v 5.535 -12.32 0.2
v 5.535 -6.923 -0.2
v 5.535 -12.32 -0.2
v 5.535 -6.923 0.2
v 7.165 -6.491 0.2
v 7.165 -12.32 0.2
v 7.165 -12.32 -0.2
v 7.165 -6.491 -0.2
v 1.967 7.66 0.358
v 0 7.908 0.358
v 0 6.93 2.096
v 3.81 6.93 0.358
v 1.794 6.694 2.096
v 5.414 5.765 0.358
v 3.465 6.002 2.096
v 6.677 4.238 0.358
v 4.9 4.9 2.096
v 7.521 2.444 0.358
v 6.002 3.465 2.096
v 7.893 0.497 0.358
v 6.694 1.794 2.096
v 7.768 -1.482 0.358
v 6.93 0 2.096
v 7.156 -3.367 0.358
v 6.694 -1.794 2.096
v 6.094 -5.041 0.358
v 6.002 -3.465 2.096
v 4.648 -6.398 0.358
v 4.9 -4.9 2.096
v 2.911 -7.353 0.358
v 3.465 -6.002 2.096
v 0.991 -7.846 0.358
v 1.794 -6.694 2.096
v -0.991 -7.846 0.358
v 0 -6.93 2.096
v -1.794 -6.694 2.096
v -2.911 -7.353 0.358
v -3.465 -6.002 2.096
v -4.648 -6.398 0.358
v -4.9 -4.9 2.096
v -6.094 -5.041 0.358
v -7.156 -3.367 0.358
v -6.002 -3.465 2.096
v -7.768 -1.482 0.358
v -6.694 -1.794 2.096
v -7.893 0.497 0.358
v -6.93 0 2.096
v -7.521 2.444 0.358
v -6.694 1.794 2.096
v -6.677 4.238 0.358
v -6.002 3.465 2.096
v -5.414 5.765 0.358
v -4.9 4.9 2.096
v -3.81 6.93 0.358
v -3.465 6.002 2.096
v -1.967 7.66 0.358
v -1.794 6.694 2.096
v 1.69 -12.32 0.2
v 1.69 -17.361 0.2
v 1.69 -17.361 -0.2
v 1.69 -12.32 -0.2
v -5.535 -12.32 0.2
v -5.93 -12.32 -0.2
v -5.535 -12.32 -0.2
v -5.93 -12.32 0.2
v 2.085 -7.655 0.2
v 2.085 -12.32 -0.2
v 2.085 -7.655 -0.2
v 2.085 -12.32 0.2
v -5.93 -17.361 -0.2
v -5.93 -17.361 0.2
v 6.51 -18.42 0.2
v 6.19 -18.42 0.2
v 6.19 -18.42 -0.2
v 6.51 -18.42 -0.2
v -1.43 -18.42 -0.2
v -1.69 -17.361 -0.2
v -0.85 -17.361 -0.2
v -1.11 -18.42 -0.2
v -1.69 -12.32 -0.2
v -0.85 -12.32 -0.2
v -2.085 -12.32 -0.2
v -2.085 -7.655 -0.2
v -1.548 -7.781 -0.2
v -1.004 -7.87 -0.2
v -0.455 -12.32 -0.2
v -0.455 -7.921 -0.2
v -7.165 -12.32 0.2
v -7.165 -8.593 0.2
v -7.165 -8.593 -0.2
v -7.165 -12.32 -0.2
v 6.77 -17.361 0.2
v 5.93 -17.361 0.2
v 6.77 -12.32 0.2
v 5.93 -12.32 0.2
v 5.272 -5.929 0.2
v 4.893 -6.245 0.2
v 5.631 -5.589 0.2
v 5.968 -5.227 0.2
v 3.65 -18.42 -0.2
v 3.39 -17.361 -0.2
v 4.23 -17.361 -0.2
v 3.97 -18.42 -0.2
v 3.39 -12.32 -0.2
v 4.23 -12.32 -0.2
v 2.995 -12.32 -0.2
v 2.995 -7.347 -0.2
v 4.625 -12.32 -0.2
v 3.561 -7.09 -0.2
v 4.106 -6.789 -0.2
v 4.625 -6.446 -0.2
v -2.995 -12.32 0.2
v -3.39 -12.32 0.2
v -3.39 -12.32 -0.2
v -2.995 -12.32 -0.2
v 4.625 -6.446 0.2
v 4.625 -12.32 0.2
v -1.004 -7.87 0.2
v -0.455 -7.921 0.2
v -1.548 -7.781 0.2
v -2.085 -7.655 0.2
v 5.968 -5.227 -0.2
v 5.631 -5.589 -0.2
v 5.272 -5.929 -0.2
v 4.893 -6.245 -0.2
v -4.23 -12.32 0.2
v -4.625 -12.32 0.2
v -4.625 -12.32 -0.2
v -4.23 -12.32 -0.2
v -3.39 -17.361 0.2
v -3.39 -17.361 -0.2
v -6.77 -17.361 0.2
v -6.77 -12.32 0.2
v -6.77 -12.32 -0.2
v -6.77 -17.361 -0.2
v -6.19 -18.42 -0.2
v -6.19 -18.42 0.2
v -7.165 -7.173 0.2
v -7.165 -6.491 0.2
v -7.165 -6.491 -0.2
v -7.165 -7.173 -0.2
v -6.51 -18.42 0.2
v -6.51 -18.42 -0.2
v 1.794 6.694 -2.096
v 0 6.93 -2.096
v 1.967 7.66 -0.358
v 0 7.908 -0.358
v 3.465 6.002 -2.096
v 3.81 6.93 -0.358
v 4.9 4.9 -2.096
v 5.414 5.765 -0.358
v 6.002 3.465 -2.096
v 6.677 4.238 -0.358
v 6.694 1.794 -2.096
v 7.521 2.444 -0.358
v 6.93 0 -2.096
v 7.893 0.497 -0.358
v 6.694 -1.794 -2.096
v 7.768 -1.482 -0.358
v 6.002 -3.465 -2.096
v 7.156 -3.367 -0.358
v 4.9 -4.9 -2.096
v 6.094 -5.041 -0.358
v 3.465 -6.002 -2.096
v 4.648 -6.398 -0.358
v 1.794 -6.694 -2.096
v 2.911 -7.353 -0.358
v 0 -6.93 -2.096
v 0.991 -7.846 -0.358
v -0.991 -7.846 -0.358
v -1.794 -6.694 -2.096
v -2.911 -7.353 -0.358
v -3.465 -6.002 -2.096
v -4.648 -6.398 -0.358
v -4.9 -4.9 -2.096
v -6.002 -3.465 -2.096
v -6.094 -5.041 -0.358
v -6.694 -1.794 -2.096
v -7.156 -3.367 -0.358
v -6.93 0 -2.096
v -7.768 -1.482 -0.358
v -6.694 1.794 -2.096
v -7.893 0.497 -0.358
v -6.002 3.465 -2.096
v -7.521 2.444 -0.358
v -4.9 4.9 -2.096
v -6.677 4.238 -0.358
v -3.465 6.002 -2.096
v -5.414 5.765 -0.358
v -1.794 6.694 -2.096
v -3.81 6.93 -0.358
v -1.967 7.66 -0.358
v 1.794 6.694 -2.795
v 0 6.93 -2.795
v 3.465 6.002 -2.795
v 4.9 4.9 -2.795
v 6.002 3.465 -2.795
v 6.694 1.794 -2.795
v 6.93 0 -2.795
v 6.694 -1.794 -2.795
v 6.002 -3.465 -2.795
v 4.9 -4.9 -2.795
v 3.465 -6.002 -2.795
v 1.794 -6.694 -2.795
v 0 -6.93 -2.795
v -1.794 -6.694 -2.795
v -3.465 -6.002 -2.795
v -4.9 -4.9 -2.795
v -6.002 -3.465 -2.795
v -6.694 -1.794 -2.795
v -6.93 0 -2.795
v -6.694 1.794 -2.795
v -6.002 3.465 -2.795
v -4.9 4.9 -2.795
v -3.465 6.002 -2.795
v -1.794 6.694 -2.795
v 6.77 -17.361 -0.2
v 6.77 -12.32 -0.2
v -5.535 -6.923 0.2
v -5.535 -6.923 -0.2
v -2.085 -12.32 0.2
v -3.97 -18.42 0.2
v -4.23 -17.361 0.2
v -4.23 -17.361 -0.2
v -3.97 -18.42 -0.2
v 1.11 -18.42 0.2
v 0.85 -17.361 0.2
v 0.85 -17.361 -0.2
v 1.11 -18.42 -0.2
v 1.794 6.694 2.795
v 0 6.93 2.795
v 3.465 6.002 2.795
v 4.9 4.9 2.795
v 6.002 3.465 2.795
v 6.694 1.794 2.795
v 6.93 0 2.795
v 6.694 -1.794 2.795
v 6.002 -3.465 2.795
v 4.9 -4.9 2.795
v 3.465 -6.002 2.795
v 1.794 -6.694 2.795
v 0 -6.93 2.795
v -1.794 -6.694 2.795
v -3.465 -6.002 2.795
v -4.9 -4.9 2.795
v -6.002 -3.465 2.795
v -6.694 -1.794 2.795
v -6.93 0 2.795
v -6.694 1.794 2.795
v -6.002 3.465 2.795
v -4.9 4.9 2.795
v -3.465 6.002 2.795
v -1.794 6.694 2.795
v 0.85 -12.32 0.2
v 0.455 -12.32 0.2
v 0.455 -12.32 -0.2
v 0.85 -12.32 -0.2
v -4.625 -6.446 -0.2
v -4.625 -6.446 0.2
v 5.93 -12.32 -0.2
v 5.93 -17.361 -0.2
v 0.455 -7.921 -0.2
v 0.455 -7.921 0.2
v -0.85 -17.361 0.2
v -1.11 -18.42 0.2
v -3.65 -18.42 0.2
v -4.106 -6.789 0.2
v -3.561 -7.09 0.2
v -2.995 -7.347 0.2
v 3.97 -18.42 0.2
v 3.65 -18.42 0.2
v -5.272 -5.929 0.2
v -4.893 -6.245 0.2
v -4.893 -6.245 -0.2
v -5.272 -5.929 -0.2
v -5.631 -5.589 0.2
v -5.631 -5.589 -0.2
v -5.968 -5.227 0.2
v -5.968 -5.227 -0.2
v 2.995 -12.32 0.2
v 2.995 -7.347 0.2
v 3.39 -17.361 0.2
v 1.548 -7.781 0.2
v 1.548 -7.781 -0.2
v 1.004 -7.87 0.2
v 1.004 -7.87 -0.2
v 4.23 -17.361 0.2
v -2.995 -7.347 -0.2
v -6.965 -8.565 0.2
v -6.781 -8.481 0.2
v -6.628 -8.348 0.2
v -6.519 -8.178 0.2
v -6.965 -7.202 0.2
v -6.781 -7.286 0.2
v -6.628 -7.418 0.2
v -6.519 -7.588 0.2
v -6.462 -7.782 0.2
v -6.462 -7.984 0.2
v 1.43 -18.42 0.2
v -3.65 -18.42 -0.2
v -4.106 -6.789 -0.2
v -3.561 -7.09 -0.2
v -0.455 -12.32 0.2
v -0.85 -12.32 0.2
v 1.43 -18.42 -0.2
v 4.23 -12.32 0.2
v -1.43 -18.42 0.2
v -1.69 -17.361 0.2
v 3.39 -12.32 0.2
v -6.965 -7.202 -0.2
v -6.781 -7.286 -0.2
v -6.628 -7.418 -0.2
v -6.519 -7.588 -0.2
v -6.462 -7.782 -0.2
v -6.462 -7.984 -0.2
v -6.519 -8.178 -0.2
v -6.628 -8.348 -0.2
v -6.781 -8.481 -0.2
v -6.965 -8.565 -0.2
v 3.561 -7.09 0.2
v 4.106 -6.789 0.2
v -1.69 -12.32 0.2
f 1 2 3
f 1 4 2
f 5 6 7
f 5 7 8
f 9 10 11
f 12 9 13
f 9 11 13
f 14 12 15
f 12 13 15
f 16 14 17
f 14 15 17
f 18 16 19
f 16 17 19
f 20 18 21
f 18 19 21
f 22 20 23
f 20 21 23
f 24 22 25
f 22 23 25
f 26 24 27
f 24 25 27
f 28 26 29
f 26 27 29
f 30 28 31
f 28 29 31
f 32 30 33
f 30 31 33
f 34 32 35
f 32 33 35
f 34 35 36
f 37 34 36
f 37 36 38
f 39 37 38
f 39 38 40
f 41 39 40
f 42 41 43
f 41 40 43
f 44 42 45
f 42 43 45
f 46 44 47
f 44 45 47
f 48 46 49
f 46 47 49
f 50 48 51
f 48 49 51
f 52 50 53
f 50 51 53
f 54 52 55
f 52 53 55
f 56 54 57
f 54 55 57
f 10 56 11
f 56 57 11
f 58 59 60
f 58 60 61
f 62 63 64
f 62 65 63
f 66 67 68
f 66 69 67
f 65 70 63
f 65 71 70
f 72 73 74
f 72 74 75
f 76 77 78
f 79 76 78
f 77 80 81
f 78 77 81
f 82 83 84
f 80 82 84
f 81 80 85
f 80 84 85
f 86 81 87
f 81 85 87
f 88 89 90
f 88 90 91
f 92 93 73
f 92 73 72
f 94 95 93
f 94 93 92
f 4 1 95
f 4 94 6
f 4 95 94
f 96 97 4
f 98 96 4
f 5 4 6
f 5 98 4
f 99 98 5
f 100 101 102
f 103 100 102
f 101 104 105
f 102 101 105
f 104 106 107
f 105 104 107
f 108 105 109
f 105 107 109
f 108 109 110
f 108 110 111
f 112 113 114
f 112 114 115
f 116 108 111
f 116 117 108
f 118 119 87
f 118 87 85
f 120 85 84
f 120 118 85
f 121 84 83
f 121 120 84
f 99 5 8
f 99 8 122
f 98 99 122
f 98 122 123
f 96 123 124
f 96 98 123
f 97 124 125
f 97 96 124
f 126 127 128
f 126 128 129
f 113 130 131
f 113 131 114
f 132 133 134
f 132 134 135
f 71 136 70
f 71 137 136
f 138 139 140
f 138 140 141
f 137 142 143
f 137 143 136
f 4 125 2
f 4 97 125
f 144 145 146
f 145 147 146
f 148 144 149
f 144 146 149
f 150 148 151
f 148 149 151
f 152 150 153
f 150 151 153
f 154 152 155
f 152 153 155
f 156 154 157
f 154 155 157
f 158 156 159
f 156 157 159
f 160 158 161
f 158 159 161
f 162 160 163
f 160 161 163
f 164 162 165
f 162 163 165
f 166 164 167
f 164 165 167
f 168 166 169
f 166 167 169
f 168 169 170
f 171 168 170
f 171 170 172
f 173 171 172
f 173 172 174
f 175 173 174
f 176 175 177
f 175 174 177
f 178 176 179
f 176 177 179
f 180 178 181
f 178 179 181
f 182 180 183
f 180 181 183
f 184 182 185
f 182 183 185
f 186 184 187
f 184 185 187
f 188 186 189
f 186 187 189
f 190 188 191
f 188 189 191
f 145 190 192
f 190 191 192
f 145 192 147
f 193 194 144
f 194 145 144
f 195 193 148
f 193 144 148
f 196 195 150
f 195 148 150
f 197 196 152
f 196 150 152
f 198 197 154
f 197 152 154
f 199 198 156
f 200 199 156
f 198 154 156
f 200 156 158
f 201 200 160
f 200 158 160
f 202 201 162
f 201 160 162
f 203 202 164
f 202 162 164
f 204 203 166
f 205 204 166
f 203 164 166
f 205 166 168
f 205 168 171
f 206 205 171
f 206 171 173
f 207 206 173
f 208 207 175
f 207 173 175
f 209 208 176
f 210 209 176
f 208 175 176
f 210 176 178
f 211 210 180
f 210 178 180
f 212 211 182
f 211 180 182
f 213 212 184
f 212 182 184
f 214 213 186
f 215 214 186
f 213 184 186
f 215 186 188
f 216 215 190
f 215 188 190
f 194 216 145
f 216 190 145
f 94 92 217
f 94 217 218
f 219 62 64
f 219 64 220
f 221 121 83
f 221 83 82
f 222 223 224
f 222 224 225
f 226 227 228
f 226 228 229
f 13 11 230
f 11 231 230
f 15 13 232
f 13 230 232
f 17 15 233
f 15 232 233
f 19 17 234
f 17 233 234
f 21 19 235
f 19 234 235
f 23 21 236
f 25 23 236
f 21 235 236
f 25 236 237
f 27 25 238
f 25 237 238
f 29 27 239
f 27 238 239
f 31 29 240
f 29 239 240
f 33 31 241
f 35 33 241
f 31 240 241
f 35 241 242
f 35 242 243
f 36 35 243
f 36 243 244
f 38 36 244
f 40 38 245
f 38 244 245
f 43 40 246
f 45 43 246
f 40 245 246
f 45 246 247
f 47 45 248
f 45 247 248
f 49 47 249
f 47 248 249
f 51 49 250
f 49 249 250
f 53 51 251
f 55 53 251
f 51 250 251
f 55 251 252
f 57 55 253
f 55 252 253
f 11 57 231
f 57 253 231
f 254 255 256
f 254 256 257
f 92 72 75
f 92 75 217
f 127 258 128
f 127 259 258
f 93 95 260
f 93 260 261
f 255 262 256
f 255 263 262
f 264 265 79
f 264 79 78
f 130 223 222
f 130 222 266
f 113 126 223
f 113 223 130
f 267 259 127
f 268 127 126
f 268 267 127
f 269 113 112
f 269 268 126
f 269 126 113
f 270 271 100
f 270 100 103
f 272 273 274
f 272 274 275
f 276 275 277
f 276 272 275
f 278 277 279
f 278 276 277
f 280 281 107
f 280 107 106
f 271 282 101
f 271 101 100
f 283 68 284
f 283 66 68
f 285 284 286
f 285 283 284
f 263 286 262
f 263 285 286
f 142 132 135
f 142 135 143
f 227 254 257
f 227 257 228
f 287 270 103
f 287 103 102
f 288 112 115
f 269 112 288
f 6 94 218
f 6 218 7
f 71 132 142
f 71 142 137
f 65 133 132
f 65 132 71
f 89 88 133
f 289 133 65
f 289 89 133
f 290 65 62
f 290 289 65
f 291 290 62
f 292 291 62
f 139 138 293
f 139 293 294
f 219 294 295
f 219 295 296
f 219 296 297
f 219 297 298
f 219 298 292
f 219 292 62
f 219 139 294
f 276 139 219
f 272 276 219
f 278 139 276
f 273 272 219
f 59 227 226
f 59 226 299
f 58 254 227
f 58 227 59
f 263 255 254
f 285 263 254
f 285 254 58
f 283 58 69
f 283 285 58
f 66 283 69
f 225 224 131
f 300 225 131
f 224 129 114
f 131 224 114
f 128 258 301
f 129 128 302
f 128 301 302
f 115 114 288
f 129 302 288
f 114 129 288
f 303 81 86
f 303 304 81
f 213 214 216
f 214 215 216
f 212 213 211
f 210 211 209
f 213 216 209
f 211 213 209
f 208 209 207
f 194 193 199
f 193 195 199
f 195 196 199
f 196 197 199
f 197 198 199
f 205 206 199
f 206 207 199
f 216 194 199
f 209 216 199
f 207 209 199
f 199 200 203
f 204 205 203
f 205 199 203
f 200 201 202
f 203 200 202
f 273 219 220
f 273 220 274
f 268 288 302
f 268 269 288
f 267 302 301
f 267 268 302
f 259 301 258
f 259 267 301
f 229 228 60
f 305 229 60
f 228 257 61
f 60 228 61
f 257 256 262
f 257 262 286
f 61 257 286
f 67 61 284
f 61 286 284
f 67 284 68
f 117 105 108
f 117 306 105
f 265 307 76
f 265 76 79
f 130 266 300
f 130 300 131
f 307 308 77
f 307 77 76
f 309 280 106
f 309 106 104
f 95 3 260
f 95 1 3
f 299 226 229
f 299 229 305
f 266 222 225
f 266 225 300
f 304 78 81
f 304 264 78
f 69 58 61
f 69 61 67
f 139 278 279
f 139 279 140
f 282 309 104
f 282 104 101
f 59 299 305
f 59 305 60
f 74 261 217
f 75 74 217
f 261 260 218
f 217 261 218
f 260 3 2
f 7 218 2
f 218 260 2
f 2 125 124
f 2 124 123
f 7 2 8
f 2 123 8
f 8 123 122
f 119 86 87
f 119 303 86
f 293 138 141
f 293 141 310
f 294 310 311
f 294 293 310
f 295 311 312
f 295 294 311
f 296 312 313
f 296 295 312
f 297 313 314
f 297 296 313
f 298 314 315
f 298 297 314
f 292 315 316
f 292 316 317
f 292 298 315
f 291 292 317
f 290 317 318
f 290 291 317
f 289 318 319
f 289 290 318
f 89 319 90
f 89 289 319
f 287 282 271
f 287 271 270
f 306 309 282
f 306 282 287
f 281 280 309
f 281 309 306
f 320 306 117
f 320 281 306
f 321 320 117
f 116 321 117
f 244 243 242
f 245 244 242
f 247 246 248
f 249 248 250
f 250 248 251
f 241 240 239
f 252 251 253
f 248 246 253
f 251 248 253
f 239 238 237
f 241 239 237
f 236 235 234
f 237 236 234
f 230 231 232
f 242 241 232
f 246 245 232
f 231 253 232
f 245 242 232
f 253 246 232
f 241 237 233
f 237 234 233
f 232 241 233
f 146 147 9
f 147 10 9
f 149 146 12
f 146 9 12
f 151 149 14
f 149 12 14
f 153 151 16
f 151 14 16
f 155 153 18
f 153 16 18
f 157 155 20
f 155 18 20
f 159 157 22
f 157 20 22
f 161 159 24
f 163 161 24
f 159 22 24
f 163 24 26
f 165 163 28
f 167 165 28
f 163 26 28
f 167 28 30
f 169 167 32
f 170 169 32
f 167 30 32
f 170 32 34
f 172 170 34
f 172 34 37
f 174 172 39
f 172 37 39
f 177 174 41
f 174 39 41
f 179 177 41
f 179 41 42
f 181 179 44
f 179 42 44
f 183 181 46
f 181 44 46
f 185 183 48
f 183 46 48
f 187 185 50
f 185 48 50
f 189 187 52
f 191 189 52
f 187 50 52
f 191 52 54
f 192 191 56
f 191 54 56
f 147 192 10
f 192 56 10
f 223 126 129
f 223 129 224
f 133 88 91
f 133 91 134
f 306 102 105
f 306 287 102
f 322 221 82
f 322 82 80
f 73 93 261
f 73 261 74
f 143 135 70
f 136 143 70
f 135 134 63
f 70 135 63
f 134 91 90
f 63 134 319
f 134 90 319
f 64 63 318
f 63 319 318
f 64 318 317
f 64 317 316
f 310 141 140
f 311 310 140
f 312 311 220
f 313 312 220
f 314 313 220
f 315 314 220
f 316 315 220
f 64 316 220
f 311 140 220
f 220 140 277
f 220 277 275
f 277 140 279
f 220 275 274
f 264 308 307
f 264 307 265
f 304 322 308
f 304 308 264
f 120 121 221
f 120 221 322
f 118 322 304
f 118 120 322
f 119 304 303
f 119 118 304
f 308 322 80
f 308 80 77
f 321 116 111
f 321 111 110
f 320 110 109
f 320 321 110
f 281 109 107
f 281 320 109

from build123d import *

# Parameters (mm, degrees)
EXTRUDE6_DEPTH        = 0.2
EXTRUDE6_DEPTH_BACK   = 0.2
EXTRUDE6_2_DEPTH      = 0.2
EXTRUDE6_2_DEPTH_BACK = 0.2
EXTRUDE6_3_DEPTH      = 0.2
EXTRUDE6_3_DEPTH_BACK = 0.2
EXTRUDE6_4_DEPTH      = 0.2
EXTRUDE6_4_DEPTH_BACK = 0.2
EXTRUDE6_5_DEPTH      = 0.2
EXTRUDE6_5_DEPTH_BACK = 0.2
EXTRUDE6_6_DEPTH      = 0.2
EXTRUDE6_6_DEPTH_BACK = 0.2


with BuildPart() as part:
    # Sketch7 → Extrude6 (new body, two sides)
    with BuildSketch(Plane.XY) as extrude6_sk:
        with BuildLine():
            Line((-5.93, -12.32), (-5.535, -12.32))
            Line((-5.535, -12.32), (-5.535, -6.923244628))
            Line((-5.535, -6.923244628), (-4.893151867, -6.24528278))
            ThreePointArc((-4.893151867, -6.24528278), (-5.454552369, -5.761453866), (-5.968357327, -5.227351434))
            Line((-5.968357327, -5.227351434), (-7.165, -6.49132345))
            Line((-7.165, -6.49132345), (-7.165, -7.17281133))
            ThreePointArc((-7.165, -7.17281133), (-6.454703172, -7.883108158), (-7.165, -8.593404986))
            Line((-7.165, -8.593404986), (-7.165, -12.32))
            Line((-7.165, -12.32), (-6.77, -12.32))
            Line((-6.77, -12.32), (-6.77, -17.360738904))
            Line((-6.77, -17.360738904), (-6.510329667, -18.42))
            Line((-6.510329667, -18.42), (-6.189670333, -18.42))
            Line((-6.189670333, -18.42), (-5.93, -17.360738904))
            Line((-5.93, -17.360738904), (-5.93, -12.32))
        make_face()
    extrude(amount=EXTRUDE6_DEPTH)
    extrude(extrude6_sk.sketch, amount=-EXTRUDE6_DEPTH_BACK)


with BuildPart() as body_2:
    # Sketch7 → Extrude6 2 (new body, two sides)
    with BuildSketch(Plane.XY) as extrude6_2_sk:
        with BuildLine():
            Line((-4.625, -6.446384041), (-4.625, -12.32))
            Line((-4.625, -12.32), (-4.23, -12.32))
            Line((-4.23, -12.32), (-4.23, -17.360738904))
            Line((-4.23, -17.360738904), (-3.970329667, -18.42))
            Line((-3.970329667, -18.42), (-3.649670333, -18.42))
            Line((-3.649670333, -18.42), (-3.39, -17.360738904))
            Line((-3.39, -17.360738904), (-3.39, -12.32))
            Line((-3.39, -12.32), (-2.995, -12.32))
            Line((-2.995, -12.32), (-2.995, -7.34686785))
            ThreePointArc((-2.995, -7.34686785), (-3.836511146, -6.944614779), (-4.625, -6.446384041))
        make_face()
    extrude(amount=EXTRUDE6_2_DEPTH)
    extrude(extrude6_2_sk.sketch, amount=-EXTRUDE6_2_DEPTH_BACK)


with BuildPart() as body_3:
    # Sketch7 → Extrude6 3 (new body, two sides)
    with BuildSketch(Plane.XY) as extrude6_3_sk:
        with BuildLine():
            Line((-0.455, -12.32), (-0.455, -7.920824907))
            ThreePointArc((-0.455, -7.920824907), (-1.276935244, -7.830448811), (-2.085, -7.65501582))
            Line((-2.085, -7.65501582), (-2.085, -12.32))
            Line((-2.085, -12.32), (-1.69, -12.32))
            Line((-1.69, -12.32), (-1.69, -17.360738904))
            Line((-1.69, -17.360738904), (-1.430329667, -18.42))
            Line((-1.430329667, -18.42), (-1.109670333, -18.42))
            Line((-1.109670333, -18.42), (-0.85, -17.360738904))
            Line((-0.85, -17.360738904), (-0.85, -12.32))
            Line((-0.85, -12.32), (-0.455, -12.32))
        make_face()
    extrude(amount=EXTRUDE6_3_DEPTH)
    extrude(extrude6_3_sk.sketch, amount=-EXTRUDE6_3_DEPTH_BACK)


with BuildPart() as body_4:
    # Sketch7 → Extrude6 4 (new body, two sides)
    with BuildSketch(Plane.XY) as extrude6_4_sk:
        with BuildLine():
            Line((4.625, -12.32), (4.625, -6.446384041))
            ThreePointArc((4.625, -6.446384041), (3.836511146, -6.944614779), (2.995, -7.34686785))
            Line((2.995, -7.34686785), (2.995, -12.32))
            Line((2.995, -12.32), (3.39, -12.32))
            Line((3.39, -12.32), (3.39, -17.360738904))
            Line((3.39, -17.360738904), (3.649670333, -18.42))
            Line((3.649670333, -18.42), (3.970329667, -18.42))
            Line((3.970329667, -18.42), (4.23, -17.360738904))
            Line((4.23, -17.360738904), (4.23, -12.32))
            Line((4.23, -12.32), (4.625, -12.32))
        make_face()
    extrude(amount=EXTRUDE6_4_DEPTH)
    extrude(extrude6_4_sk.sketch, amount=-EXTRUDE6_4_DEPTH_BACK)


with BuildPart() as body_5:
    # Sketch7 → Extrude6 5 (new body, two sides)
    with BuildSketch(Plane.XY) as extrude6_5_sk:
        with BuildLine():
            Line((0.455, -7.920824907), (0.455, -12.32))
            Line((0.455, -12.32), (0.85, -12.32))
            Line((0.85, -12.32), (0.85, -17.360738904))
            Line((0.85, -17.360738904), (1.109670333, -18.42))
            Line((1.109670333, -18.42), (1.430329667, -18.42))
            Line((1.430329667, -18.42), (1.69, -17.360738904))
            Line((1.69, -17.360738904), (1.69, -12.32))
            Line((1.69, -12.32), (2.085, -12.32))
            Line((2.085, -12.32), (2.085, -7.65501582))
            ThreePointArc((2.085, -7.65501582), (1.276935244, -7.830448811), (0.455, -7.920824907))
        make_face()
    extrude(amount=EXTRUDE6_5_DEPTH)
    extrude(extrude6_5_sk.sketch, amount=-EXTRUDE6_5_DEPTH_BACK)


with BuildPart() as body_6:
    # Sketch7 → Extrude6 6 (new body, two sides)
    with BuildSketch(Plane.XY) as extrude6_6_sk:
        with BuildLine():
            Line((5.535, -12.32), (5.93, -12.32))
            Line((5.93, -12.32), (5.93, -17.360738904))
            Line((5.93, -17.360738904), (6.189670333, -18.42))
            Line((6.189670333, -18.42), (6.510329667, -18.42))
            Line((6.510329667, -18.42), (6.77, -17.360738904))
            Line((6.77, -17.360738904), (6.77, -12.32))
            Line((6.77, -12.32), (7.165, -12.32))
            Line((7.165, -12.32), (7.165, -6.49132345))
            Line((7.165, -6.49132345), (5.968357327, -5.227351434))
            ThreePointArc((5.968357327, -5.227351434), (5.454552369, -5.761453866), (4.893151867, -6.24528278))
            Line((4.893151867, -6.24528278), (5.535, -6.923244628))
            Line((5.535, -6.923244628), (5.535, -12.32))
        make_face()
    extrude(amount=EXTRUDE6_6_DEPTH)
    extrude(extrude6_6_sk.sketch, amount=-EXTRUDE6_6_DEPTH_BACK)


with BuildPart() as body_7:
    # Sketch8 → Revolve1 (revolve)
    with BuildSketch(Plane(origin=(0, 0, 0), x_dir=(0, 0, -1), z_dir=(1, 0, 0))):
        Polygon((2.795, 0), (2.795, 6.93), (2.096257799, 6.93), (0.358195537, 7.908398157), (-0.358195537, 7.908398157), (-2.096257799, 6.93), (-2.795, 6.93), (-2.795, 0), align=None)
    revolve(axis=Axis((0, 0, -2.795), (0, 0, -1)))


solid = Compound([part.part, body_2.part, body_3.part, body_4.part, body_5.part, body_6.part, body_7.part])
